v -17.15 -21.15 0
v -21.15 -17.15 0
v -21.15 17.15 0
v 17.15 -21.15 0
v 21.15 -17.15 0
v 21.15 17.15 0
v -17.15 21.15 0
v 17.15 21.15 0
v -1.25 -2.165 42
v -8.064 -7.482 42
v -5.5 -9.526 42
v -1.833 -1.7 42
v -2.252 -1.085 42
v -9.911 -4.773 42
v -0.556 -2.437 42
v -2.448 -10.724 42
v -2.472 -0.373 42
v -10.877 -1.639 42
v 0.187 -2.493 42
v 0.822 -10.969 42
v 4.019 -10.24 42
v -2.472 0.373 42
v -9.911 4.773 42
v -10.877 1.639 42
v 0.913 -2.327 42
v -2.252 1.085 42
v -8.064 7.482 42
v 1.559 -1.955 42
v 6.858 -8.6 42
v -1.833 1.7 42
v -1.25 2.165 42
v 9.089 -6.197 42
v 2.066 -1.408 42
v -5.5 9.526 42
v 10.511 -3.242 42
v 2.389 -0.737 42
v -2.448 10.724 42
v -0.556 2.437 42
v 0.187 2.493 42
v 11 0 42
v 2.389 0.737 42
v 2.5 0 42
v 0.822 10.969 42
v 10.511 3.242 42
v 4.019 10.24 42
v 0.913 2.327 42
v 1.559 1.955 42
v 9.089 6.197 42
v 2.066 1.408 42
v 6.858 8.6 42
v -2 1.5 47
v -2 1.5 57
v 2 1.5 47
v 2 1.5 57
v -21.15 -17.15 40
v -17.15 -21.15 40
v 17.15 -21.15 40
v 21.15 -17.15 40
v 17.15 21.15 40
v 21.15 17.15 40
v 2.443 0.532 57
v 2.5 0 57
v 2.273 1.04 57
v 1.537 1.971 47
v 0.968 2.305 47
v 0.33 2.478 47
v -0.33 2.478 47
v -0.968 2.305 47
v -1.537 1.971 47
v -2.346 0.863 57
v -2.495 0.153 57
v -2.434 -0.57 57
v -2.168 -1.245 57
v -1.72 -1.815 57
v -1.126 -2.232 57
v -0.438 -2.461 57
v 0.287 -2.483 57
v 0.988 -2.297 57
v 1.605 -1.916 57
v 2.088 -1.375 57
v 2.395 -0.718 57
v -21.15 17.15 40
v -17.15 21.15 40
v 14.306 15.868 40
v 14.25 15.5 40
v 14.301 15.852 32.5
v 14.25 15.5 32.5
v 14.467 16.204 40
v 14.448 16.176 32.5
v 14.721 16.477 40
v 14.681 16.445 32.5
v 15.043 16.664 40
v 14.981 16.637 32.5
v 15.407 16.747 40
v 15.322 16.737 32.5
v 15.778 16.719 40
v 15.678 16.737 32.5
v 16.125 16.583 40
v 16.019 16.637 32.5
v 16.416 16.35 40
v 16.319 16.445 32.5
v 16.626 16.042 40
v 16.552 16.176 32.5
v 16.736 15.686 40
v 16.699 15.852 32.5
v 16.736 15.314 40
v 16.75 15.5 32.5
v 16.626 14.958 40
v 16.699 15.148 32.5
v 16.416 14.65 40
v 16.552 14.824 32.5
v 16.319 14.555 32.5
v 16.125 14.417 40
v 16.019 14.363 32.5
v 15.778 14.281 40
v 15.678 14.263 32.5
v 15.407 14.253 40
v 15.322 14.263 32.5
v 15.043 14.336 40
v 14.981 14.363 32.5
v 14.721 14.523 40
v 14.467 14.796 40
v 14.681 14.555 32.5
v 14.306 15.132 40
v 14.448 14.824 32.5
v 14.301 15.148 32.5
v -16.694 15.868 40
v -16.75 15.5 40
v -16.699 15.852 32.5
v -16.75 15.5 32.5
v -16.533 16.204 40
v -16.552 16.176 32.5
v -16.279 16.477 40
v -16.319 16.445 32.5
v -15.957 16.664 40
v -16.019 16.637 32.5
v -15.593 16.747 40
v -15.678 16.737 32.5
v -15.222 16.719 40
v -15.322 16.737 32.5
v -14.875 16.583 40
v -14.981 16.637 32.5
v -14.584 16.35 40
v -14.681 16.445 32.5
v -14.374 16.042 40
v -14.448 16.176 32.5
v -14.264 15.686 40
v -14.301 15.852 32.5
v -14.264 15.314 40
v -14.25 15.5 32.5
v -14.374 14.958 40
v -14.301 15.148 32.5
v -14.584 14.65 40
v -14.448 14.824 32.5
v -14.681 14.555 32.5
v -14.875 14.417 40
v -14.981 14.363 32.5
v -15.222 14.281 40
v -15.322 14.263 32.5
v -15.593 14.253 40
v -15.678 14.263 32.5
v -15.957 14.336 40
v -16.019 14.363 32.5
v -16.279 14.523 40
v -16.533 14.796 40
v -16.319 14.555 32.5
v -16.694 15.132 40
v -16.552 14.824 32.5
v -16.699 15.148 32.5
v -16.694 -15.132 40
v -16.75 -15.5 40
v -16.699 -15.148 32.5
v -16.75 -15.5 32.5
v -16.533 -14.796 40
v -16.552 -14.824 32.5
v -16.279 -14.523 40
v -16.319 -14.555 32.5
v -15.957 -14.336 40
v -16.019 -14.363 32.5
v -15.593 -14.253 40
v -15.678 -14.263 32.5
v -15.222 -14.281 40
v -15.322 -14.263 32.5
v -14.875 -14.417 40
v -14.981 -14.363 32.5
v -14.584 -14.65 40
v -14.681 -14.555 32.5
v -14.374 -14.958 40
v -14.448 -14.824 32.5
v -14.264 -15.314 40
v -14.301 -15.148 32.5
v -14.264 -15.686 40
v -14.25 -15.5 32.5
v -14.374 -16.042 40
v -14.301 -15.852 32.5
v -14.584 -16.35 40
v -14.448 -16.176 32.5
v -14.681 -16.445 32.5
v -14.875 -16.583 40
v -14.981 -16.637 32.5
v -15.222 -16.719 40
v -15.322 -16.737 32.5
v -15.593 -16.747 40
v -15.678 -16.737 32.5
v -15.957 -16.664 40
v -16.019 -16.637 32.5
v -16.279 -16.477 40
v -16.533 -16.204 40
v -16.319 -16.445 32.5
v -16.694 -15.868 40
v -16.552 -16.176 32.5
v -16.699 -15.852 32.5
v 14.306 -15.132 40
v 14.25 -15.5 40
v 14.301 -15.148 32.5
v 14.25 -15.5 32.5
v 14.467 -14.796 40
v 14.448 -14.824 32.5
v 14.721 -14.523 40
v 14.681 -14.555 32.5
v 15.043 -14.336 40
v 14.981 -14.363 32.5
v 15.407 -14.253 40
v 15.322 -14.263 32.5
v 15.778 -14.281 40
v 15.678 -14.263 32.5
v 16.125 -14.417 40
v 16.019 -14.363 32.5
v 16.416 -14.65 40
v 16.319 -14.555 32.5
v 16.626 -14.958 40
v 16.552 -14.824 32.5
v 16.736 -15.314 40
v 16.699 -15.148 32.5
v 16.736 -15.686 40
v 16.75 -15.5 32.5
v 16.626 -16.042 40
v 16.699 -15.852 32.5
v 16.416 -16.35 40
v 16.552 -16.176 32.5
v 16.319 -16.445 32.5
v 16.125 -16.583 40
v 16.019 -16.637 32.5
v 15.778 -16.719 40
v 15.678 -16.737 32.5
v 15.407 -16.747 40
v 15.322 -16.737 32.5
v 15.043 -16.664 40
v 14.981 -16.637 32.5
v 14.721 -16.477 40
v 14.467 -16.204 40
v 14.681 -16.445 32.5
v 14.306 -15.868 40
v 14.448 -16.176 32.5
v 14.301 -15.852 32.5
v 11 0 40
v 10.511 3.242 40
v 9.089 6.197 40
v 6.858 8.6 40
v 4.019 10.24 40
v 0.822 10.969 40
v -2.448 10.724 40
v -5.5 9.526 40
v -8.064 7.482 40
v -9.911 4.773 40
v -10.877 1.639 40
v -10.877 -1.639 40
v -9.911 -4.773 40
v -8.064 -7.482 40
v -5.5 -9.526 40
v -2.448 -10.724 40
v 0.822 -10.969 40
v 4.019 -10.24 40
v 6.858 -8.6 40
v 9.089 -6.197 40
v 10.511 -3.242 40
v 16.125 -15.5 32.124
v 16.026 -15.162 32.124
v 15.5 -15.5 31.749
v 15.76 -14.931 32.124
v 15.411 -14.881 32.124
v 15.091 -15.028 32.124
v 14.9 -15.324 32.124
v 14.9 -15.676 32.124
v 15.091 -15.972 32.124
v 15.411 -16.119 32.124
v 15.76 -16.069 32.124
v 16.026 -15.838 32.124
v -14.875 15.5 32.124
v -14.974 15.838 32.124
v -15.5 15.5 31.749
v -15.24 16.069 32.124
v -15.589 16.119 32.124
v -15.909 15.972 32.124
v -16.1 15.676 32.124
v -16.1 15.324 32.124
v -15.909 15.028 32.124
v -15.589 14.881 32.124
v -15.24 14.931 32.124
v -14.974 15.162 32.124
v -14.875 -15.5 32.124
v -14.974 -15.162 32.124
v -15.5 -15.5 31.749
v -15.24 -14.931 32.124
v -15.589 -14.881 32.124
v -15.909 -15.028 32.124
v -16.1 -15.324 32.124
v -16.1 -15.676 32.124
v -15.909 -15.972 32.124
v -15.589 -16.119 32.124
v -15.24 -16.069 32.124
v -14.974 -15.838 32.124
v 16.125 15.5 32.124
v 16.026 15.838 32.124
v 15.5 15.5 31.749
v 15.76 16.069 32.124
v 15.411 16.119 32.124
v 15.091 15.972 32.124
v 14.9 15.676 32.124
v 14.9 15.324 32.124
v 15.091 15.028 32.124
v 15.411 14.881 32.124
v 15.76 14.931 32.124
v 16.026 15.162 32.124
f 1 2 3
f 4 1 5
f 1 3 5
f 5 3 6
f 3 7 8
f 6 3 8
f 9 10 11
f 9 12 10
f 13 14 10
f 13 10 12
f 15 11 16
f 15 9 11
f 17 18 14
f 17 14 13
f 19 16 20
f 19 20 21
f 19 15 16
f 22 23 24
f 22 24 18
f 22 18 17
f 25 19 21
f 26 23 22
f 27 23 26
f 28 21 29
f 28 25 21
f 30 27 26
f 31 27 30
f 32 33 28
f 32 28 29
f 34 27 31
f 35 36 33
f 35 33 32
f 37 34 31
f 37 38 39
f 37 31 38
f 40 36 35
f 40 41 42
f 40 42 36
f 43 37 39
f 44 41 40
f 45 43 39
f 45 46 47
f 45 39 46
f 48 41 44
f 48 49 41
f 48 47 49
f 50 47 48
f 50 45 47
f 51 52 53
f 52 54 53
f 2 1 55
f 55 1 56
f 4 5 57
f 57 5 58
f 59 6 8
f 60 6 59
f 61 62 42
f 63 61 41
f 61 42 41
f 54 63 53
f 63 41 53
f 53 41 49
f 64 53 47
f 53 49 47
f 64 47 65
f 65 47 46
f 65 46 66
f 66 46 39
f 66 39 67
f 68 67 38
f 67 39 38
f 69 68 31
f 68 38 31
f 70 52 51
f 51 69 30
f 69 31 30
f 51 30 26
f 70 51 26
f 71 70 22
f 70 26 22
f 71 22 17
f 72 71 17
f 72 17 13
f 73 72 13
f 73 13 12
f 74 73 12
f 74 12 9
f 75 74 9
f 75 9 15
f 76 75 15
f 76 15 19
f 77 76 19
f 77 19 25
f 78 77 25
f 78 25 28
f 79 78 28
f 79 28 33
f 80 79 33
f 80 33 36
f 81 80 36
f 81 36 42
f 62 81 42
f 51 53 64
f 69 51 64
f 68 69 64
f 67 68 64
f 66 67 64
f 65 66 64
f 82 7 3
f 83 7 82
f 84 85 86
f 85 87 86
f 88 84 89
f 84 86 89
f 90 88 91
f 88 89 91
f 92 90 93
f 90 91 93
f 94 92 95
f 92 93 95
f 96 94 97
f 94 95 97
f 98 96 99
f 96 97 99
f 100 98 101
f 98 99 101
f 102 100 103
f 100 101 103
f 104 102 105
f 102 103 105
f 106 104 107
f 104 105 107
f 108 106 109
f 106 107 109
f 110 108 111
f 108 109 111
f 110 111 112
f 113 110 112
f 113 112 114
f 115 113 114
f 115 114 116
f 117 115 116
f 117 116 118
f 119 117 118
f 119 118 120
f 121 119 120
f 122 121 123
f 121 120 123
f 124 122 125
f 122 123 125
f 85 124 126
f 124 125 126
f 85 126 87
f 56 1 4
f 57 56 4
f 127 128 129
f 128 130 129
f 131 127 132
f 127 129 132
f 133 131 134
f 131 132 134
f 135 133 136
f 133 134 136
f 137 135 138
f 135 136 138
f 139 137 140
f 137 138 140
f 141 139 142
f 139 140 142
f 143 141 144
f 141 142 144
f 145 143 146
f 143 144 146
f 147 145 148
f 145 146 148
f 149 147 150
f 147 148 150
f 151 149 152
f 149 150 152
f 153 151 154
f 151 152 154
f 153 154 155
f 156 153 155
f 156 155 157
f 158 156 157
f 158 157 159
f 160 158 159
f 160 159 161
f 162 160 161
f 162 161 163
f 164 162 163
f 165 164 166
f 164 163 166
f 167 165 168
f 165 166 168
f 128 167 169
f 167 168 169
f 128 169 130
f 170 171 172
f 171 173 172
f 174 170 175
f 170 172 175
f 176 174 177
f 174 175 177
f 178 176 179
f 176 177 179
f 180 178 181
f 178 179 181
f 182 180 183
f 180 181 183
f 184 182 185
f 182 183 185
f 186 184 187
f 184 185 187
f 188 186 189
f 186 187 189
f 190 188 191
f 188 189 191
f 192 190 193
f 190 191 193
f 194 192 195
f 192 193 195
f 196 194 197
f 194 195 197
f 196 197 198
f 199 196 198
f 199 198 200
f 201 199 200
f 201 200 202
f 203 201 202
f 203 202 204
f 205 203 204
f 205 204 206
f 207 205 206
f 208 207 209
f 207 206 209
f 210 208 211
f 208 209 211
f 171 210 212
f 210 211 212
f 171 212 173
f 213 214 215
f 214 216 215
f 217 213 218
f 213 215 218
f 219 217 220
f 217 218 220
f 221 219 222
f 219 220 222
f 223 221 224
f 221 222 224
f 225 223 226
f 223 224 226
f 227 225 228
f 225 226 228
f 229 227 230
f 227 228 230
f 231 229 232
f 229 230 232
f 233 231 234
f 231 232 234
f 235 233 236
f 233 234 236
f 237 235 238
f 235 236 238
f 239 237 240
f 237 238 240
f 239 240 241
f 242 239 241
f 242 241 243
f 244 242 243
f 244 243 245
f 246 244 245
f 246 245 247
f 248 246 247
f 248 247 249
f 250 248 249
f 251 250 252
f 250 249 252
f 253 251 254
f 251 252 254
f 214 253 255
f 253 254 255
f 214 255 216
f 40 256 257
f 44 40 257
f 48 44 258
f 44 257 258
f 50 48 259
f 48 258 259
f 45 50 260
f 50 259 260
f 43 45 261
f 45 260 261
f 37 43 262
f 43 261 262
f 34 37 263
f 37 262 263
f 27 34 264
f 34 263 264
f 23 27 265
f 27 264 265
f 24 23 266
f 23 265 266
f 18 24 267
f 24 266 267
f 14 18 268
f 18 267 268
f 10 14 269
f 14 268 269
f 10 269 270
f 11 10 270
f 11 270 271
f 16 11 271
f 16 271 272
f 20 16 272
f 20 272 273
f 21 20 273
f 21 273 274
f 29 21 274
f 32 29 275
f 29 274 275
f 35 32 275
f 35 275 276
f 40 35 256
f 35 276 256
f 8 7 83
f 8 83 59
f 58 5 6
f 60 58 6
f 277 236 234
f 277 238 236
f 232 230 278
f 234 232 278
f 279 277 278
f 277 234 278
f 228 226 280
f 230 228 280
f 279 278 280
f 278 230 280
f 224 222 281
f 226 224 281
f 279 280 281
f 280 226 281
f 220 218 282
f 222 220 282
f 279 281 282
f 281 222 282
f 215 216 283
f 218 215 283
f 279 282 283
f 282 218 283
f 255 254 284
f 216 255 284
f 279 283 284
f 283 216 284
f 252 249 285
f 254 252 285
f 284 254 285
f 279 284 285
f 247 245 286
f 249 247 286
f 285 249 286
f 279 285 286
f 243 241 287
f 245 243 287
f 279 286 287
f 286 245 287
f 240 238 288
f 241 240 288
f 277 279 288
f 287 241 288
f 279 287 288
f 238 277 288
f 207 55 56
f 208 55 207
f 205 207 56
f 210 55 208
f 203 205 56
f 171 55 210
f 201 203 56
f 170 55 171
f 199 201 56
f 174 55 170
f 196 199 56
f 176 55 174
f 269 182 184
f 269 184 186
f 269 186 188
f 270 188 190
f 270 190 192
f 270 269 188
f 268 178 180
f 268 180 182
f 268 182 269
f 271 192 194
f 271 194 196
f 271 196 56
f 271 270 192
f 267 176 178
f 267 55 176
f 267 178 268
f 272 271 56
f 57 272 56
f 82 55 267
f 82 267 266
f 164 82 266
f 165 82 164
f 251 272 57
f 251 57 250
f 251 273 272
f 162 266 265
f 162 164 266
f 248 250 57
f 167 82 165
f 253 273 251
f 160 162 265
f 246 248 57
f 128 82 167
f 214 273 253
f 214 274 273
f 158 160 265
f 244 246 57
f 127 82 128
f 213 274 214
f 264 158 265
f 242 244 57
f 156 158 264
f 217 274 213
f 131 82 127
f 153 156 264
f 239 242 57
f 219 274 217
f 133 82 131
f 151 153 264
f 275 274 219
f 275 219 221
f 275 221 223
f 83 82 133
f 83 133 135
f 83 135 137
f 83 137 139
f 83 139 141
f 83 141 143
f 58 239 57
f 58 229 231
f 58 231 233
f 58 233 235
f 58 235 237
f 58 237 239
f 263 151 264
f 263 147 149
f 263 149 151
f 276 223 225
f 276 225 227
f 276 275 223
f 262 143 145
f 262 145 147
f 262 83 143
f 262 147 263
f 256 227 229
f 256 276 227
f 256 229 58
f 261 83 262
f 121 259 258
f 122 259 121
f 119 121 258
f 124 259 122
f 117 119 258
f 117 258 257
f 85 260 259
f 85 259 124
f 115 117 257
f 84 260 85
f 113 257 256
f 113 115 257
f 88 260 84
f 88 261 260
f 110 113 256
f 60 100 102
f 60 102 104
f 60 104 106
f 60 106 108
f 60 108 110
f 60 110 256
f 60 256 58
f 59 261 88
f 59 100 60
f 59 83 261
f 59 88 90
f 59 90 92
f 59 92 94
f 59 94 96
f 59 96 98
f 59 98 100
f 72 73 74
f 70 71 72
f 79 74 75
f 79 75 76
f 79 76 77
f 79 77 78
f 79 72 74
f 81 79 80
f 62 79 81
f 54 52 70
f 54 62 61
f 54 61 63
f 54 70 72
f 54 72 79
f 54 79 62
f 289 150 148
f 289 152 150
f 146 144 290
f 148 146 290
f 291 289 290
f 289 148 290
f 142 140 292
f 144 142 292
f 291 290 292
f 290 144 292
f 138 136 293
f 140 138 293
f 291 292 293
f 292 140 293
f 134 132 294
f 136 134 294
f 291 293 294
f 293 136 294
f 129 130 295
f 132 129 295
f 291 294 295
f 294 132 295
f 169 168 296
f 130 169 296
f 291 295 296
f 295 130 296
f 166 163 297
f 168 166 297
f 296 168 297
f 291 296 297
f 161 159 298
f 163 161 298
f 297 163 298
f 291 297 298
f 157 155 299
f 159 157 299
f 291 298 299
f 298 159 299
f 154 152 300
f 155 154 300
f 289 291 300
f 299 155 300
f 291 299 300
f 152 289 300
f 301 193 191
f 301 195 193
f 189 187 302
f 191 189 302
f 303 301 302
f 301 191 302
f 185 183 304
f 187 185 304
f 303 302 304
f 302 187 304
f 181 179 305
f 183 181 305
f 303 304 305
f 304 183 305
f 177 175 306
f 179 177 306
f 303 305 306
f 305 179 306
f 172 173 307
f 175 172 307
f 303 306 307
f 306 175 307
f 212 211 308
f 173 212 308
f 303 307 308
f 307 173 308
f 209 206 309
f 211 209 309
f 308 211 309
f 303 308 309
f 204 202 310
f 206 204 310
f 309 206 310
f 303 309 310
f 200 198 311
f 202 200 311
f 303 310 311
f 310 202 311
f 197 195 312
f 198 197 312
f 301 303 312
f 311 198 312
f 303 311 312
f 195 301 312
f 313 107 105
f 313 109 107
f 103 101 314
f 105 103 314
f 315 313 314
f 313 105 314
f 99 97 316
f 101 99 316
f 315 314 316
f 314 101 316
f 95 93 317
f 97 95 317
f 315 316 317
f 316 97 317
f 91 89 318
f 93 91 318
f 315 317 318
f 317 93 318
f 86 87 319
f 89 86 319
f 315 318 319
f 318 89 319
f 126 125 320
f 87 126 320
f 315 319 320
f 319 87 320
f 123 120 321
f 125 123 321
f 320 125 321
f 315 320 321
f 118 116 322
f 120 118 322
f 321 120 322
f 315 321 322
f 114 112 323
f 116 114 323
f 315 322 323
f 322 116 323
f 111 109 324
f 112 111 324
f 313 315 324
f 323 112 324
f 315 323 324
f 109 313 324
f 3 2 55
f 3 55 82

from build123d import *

# Parameters (mm, degrees)
SKETCH_1_W             = 42.3
SKETCH_1_H             = 42.3
EXTRUDE_1_DEPTH        = 40
SKETCH_2_R             = 11
EXTRUDE_2_DEPTH        = 2
SKETCH_3_R             = 2.5
EXTRUDE_3_DEPTH        = 15
SKETCH_4_W             = 22.313934425
SKETCH_4_H             = 9.701954983
CUT_EXTRUDE_1_DEPTH    = 11
CHAMFER_1_SIZE         = 4
HOLE_WIZARD_M3_1_D     = 2.5
HOLE_WIZARD_M3_1_DEPTH = 7.5
HOLE_WIZARD_M3_1_TIP   = 0.751075774


with BuildPart() as part:
    # 草图1 → 凸台-拉伸1 (new body)
    with BuildSketch(Plane.XY):
        Rectangle(SKETCH_1_W, SKETCH_1_H)
    extrude(amount=EXTRUDE_1_DEPTH)

    # 草图2 → 凸台-拉伸2 (add)
    with BuildSketch(Plane.XY.offset(40)):
        Circle(SKETCH_2_R)
    extrude(amount=EXTRUDE_2_DEPTH)

    # 草图3 → 凸台-拉伸3 (add)
    with BuildSketch(Plane.XY.offset(42)):
        Circle(SKETCH_3_R)
    extrude(amount=EXTRUDE_3_DEPTH)

    # 草图4 → 切除-拉伸1 (cut, symmetric)
    with BuildSketch(Plane(origin=(0, 0, 0), x_dir=(0, 0, -1), z_dir=(1, 0, 0))):
        with Locations((-58.156967212, 6.350977492)):
            Rectangle(SKETCH_4_W, SKETCH_4_H)
    extrude(amount=CUT_EXTRUDE_1_DEPTH, both=True, mode=Mode.SUBTRACT)

    # 倒角1
    chamfer_1_edges = [part.edges().sort_by_distance(p)[0] for p in [
        (21.15, -21.15, 20),
        (-21.15, -21.15, 20),
        (-21.15, 21.15, 20),
        (21.15, 21.15, 20),
    ]]
    chamfer(chamfer_1_edges, length=CHAMFER_1_SIZE)

    # M3 螺纹孔1
    with Locations(Plane.XY.offset(40)):
        with Locations((-15.5, 15.5), (-15.5, -15.5), (15.5, -15.5), (15.5, 15.5)):
            Hole(HOLE_WIZARD_M3_1_D / 2, depth=HOLE_WIZARD_M3_1_DEPTH)
            with Locations((0, 0, -(HOLE_WIZARD_M3_1_DEPTH + HOLE_WIZARD_M3_1_TIP / 2))):  # 118° drill point
                Cone(0, HOLE_WIZARD_M3_1_D / 2, HOLE_WIZARD_M3_1_TIP, mode=Mode.SUBTRACT)


solid = part.part
